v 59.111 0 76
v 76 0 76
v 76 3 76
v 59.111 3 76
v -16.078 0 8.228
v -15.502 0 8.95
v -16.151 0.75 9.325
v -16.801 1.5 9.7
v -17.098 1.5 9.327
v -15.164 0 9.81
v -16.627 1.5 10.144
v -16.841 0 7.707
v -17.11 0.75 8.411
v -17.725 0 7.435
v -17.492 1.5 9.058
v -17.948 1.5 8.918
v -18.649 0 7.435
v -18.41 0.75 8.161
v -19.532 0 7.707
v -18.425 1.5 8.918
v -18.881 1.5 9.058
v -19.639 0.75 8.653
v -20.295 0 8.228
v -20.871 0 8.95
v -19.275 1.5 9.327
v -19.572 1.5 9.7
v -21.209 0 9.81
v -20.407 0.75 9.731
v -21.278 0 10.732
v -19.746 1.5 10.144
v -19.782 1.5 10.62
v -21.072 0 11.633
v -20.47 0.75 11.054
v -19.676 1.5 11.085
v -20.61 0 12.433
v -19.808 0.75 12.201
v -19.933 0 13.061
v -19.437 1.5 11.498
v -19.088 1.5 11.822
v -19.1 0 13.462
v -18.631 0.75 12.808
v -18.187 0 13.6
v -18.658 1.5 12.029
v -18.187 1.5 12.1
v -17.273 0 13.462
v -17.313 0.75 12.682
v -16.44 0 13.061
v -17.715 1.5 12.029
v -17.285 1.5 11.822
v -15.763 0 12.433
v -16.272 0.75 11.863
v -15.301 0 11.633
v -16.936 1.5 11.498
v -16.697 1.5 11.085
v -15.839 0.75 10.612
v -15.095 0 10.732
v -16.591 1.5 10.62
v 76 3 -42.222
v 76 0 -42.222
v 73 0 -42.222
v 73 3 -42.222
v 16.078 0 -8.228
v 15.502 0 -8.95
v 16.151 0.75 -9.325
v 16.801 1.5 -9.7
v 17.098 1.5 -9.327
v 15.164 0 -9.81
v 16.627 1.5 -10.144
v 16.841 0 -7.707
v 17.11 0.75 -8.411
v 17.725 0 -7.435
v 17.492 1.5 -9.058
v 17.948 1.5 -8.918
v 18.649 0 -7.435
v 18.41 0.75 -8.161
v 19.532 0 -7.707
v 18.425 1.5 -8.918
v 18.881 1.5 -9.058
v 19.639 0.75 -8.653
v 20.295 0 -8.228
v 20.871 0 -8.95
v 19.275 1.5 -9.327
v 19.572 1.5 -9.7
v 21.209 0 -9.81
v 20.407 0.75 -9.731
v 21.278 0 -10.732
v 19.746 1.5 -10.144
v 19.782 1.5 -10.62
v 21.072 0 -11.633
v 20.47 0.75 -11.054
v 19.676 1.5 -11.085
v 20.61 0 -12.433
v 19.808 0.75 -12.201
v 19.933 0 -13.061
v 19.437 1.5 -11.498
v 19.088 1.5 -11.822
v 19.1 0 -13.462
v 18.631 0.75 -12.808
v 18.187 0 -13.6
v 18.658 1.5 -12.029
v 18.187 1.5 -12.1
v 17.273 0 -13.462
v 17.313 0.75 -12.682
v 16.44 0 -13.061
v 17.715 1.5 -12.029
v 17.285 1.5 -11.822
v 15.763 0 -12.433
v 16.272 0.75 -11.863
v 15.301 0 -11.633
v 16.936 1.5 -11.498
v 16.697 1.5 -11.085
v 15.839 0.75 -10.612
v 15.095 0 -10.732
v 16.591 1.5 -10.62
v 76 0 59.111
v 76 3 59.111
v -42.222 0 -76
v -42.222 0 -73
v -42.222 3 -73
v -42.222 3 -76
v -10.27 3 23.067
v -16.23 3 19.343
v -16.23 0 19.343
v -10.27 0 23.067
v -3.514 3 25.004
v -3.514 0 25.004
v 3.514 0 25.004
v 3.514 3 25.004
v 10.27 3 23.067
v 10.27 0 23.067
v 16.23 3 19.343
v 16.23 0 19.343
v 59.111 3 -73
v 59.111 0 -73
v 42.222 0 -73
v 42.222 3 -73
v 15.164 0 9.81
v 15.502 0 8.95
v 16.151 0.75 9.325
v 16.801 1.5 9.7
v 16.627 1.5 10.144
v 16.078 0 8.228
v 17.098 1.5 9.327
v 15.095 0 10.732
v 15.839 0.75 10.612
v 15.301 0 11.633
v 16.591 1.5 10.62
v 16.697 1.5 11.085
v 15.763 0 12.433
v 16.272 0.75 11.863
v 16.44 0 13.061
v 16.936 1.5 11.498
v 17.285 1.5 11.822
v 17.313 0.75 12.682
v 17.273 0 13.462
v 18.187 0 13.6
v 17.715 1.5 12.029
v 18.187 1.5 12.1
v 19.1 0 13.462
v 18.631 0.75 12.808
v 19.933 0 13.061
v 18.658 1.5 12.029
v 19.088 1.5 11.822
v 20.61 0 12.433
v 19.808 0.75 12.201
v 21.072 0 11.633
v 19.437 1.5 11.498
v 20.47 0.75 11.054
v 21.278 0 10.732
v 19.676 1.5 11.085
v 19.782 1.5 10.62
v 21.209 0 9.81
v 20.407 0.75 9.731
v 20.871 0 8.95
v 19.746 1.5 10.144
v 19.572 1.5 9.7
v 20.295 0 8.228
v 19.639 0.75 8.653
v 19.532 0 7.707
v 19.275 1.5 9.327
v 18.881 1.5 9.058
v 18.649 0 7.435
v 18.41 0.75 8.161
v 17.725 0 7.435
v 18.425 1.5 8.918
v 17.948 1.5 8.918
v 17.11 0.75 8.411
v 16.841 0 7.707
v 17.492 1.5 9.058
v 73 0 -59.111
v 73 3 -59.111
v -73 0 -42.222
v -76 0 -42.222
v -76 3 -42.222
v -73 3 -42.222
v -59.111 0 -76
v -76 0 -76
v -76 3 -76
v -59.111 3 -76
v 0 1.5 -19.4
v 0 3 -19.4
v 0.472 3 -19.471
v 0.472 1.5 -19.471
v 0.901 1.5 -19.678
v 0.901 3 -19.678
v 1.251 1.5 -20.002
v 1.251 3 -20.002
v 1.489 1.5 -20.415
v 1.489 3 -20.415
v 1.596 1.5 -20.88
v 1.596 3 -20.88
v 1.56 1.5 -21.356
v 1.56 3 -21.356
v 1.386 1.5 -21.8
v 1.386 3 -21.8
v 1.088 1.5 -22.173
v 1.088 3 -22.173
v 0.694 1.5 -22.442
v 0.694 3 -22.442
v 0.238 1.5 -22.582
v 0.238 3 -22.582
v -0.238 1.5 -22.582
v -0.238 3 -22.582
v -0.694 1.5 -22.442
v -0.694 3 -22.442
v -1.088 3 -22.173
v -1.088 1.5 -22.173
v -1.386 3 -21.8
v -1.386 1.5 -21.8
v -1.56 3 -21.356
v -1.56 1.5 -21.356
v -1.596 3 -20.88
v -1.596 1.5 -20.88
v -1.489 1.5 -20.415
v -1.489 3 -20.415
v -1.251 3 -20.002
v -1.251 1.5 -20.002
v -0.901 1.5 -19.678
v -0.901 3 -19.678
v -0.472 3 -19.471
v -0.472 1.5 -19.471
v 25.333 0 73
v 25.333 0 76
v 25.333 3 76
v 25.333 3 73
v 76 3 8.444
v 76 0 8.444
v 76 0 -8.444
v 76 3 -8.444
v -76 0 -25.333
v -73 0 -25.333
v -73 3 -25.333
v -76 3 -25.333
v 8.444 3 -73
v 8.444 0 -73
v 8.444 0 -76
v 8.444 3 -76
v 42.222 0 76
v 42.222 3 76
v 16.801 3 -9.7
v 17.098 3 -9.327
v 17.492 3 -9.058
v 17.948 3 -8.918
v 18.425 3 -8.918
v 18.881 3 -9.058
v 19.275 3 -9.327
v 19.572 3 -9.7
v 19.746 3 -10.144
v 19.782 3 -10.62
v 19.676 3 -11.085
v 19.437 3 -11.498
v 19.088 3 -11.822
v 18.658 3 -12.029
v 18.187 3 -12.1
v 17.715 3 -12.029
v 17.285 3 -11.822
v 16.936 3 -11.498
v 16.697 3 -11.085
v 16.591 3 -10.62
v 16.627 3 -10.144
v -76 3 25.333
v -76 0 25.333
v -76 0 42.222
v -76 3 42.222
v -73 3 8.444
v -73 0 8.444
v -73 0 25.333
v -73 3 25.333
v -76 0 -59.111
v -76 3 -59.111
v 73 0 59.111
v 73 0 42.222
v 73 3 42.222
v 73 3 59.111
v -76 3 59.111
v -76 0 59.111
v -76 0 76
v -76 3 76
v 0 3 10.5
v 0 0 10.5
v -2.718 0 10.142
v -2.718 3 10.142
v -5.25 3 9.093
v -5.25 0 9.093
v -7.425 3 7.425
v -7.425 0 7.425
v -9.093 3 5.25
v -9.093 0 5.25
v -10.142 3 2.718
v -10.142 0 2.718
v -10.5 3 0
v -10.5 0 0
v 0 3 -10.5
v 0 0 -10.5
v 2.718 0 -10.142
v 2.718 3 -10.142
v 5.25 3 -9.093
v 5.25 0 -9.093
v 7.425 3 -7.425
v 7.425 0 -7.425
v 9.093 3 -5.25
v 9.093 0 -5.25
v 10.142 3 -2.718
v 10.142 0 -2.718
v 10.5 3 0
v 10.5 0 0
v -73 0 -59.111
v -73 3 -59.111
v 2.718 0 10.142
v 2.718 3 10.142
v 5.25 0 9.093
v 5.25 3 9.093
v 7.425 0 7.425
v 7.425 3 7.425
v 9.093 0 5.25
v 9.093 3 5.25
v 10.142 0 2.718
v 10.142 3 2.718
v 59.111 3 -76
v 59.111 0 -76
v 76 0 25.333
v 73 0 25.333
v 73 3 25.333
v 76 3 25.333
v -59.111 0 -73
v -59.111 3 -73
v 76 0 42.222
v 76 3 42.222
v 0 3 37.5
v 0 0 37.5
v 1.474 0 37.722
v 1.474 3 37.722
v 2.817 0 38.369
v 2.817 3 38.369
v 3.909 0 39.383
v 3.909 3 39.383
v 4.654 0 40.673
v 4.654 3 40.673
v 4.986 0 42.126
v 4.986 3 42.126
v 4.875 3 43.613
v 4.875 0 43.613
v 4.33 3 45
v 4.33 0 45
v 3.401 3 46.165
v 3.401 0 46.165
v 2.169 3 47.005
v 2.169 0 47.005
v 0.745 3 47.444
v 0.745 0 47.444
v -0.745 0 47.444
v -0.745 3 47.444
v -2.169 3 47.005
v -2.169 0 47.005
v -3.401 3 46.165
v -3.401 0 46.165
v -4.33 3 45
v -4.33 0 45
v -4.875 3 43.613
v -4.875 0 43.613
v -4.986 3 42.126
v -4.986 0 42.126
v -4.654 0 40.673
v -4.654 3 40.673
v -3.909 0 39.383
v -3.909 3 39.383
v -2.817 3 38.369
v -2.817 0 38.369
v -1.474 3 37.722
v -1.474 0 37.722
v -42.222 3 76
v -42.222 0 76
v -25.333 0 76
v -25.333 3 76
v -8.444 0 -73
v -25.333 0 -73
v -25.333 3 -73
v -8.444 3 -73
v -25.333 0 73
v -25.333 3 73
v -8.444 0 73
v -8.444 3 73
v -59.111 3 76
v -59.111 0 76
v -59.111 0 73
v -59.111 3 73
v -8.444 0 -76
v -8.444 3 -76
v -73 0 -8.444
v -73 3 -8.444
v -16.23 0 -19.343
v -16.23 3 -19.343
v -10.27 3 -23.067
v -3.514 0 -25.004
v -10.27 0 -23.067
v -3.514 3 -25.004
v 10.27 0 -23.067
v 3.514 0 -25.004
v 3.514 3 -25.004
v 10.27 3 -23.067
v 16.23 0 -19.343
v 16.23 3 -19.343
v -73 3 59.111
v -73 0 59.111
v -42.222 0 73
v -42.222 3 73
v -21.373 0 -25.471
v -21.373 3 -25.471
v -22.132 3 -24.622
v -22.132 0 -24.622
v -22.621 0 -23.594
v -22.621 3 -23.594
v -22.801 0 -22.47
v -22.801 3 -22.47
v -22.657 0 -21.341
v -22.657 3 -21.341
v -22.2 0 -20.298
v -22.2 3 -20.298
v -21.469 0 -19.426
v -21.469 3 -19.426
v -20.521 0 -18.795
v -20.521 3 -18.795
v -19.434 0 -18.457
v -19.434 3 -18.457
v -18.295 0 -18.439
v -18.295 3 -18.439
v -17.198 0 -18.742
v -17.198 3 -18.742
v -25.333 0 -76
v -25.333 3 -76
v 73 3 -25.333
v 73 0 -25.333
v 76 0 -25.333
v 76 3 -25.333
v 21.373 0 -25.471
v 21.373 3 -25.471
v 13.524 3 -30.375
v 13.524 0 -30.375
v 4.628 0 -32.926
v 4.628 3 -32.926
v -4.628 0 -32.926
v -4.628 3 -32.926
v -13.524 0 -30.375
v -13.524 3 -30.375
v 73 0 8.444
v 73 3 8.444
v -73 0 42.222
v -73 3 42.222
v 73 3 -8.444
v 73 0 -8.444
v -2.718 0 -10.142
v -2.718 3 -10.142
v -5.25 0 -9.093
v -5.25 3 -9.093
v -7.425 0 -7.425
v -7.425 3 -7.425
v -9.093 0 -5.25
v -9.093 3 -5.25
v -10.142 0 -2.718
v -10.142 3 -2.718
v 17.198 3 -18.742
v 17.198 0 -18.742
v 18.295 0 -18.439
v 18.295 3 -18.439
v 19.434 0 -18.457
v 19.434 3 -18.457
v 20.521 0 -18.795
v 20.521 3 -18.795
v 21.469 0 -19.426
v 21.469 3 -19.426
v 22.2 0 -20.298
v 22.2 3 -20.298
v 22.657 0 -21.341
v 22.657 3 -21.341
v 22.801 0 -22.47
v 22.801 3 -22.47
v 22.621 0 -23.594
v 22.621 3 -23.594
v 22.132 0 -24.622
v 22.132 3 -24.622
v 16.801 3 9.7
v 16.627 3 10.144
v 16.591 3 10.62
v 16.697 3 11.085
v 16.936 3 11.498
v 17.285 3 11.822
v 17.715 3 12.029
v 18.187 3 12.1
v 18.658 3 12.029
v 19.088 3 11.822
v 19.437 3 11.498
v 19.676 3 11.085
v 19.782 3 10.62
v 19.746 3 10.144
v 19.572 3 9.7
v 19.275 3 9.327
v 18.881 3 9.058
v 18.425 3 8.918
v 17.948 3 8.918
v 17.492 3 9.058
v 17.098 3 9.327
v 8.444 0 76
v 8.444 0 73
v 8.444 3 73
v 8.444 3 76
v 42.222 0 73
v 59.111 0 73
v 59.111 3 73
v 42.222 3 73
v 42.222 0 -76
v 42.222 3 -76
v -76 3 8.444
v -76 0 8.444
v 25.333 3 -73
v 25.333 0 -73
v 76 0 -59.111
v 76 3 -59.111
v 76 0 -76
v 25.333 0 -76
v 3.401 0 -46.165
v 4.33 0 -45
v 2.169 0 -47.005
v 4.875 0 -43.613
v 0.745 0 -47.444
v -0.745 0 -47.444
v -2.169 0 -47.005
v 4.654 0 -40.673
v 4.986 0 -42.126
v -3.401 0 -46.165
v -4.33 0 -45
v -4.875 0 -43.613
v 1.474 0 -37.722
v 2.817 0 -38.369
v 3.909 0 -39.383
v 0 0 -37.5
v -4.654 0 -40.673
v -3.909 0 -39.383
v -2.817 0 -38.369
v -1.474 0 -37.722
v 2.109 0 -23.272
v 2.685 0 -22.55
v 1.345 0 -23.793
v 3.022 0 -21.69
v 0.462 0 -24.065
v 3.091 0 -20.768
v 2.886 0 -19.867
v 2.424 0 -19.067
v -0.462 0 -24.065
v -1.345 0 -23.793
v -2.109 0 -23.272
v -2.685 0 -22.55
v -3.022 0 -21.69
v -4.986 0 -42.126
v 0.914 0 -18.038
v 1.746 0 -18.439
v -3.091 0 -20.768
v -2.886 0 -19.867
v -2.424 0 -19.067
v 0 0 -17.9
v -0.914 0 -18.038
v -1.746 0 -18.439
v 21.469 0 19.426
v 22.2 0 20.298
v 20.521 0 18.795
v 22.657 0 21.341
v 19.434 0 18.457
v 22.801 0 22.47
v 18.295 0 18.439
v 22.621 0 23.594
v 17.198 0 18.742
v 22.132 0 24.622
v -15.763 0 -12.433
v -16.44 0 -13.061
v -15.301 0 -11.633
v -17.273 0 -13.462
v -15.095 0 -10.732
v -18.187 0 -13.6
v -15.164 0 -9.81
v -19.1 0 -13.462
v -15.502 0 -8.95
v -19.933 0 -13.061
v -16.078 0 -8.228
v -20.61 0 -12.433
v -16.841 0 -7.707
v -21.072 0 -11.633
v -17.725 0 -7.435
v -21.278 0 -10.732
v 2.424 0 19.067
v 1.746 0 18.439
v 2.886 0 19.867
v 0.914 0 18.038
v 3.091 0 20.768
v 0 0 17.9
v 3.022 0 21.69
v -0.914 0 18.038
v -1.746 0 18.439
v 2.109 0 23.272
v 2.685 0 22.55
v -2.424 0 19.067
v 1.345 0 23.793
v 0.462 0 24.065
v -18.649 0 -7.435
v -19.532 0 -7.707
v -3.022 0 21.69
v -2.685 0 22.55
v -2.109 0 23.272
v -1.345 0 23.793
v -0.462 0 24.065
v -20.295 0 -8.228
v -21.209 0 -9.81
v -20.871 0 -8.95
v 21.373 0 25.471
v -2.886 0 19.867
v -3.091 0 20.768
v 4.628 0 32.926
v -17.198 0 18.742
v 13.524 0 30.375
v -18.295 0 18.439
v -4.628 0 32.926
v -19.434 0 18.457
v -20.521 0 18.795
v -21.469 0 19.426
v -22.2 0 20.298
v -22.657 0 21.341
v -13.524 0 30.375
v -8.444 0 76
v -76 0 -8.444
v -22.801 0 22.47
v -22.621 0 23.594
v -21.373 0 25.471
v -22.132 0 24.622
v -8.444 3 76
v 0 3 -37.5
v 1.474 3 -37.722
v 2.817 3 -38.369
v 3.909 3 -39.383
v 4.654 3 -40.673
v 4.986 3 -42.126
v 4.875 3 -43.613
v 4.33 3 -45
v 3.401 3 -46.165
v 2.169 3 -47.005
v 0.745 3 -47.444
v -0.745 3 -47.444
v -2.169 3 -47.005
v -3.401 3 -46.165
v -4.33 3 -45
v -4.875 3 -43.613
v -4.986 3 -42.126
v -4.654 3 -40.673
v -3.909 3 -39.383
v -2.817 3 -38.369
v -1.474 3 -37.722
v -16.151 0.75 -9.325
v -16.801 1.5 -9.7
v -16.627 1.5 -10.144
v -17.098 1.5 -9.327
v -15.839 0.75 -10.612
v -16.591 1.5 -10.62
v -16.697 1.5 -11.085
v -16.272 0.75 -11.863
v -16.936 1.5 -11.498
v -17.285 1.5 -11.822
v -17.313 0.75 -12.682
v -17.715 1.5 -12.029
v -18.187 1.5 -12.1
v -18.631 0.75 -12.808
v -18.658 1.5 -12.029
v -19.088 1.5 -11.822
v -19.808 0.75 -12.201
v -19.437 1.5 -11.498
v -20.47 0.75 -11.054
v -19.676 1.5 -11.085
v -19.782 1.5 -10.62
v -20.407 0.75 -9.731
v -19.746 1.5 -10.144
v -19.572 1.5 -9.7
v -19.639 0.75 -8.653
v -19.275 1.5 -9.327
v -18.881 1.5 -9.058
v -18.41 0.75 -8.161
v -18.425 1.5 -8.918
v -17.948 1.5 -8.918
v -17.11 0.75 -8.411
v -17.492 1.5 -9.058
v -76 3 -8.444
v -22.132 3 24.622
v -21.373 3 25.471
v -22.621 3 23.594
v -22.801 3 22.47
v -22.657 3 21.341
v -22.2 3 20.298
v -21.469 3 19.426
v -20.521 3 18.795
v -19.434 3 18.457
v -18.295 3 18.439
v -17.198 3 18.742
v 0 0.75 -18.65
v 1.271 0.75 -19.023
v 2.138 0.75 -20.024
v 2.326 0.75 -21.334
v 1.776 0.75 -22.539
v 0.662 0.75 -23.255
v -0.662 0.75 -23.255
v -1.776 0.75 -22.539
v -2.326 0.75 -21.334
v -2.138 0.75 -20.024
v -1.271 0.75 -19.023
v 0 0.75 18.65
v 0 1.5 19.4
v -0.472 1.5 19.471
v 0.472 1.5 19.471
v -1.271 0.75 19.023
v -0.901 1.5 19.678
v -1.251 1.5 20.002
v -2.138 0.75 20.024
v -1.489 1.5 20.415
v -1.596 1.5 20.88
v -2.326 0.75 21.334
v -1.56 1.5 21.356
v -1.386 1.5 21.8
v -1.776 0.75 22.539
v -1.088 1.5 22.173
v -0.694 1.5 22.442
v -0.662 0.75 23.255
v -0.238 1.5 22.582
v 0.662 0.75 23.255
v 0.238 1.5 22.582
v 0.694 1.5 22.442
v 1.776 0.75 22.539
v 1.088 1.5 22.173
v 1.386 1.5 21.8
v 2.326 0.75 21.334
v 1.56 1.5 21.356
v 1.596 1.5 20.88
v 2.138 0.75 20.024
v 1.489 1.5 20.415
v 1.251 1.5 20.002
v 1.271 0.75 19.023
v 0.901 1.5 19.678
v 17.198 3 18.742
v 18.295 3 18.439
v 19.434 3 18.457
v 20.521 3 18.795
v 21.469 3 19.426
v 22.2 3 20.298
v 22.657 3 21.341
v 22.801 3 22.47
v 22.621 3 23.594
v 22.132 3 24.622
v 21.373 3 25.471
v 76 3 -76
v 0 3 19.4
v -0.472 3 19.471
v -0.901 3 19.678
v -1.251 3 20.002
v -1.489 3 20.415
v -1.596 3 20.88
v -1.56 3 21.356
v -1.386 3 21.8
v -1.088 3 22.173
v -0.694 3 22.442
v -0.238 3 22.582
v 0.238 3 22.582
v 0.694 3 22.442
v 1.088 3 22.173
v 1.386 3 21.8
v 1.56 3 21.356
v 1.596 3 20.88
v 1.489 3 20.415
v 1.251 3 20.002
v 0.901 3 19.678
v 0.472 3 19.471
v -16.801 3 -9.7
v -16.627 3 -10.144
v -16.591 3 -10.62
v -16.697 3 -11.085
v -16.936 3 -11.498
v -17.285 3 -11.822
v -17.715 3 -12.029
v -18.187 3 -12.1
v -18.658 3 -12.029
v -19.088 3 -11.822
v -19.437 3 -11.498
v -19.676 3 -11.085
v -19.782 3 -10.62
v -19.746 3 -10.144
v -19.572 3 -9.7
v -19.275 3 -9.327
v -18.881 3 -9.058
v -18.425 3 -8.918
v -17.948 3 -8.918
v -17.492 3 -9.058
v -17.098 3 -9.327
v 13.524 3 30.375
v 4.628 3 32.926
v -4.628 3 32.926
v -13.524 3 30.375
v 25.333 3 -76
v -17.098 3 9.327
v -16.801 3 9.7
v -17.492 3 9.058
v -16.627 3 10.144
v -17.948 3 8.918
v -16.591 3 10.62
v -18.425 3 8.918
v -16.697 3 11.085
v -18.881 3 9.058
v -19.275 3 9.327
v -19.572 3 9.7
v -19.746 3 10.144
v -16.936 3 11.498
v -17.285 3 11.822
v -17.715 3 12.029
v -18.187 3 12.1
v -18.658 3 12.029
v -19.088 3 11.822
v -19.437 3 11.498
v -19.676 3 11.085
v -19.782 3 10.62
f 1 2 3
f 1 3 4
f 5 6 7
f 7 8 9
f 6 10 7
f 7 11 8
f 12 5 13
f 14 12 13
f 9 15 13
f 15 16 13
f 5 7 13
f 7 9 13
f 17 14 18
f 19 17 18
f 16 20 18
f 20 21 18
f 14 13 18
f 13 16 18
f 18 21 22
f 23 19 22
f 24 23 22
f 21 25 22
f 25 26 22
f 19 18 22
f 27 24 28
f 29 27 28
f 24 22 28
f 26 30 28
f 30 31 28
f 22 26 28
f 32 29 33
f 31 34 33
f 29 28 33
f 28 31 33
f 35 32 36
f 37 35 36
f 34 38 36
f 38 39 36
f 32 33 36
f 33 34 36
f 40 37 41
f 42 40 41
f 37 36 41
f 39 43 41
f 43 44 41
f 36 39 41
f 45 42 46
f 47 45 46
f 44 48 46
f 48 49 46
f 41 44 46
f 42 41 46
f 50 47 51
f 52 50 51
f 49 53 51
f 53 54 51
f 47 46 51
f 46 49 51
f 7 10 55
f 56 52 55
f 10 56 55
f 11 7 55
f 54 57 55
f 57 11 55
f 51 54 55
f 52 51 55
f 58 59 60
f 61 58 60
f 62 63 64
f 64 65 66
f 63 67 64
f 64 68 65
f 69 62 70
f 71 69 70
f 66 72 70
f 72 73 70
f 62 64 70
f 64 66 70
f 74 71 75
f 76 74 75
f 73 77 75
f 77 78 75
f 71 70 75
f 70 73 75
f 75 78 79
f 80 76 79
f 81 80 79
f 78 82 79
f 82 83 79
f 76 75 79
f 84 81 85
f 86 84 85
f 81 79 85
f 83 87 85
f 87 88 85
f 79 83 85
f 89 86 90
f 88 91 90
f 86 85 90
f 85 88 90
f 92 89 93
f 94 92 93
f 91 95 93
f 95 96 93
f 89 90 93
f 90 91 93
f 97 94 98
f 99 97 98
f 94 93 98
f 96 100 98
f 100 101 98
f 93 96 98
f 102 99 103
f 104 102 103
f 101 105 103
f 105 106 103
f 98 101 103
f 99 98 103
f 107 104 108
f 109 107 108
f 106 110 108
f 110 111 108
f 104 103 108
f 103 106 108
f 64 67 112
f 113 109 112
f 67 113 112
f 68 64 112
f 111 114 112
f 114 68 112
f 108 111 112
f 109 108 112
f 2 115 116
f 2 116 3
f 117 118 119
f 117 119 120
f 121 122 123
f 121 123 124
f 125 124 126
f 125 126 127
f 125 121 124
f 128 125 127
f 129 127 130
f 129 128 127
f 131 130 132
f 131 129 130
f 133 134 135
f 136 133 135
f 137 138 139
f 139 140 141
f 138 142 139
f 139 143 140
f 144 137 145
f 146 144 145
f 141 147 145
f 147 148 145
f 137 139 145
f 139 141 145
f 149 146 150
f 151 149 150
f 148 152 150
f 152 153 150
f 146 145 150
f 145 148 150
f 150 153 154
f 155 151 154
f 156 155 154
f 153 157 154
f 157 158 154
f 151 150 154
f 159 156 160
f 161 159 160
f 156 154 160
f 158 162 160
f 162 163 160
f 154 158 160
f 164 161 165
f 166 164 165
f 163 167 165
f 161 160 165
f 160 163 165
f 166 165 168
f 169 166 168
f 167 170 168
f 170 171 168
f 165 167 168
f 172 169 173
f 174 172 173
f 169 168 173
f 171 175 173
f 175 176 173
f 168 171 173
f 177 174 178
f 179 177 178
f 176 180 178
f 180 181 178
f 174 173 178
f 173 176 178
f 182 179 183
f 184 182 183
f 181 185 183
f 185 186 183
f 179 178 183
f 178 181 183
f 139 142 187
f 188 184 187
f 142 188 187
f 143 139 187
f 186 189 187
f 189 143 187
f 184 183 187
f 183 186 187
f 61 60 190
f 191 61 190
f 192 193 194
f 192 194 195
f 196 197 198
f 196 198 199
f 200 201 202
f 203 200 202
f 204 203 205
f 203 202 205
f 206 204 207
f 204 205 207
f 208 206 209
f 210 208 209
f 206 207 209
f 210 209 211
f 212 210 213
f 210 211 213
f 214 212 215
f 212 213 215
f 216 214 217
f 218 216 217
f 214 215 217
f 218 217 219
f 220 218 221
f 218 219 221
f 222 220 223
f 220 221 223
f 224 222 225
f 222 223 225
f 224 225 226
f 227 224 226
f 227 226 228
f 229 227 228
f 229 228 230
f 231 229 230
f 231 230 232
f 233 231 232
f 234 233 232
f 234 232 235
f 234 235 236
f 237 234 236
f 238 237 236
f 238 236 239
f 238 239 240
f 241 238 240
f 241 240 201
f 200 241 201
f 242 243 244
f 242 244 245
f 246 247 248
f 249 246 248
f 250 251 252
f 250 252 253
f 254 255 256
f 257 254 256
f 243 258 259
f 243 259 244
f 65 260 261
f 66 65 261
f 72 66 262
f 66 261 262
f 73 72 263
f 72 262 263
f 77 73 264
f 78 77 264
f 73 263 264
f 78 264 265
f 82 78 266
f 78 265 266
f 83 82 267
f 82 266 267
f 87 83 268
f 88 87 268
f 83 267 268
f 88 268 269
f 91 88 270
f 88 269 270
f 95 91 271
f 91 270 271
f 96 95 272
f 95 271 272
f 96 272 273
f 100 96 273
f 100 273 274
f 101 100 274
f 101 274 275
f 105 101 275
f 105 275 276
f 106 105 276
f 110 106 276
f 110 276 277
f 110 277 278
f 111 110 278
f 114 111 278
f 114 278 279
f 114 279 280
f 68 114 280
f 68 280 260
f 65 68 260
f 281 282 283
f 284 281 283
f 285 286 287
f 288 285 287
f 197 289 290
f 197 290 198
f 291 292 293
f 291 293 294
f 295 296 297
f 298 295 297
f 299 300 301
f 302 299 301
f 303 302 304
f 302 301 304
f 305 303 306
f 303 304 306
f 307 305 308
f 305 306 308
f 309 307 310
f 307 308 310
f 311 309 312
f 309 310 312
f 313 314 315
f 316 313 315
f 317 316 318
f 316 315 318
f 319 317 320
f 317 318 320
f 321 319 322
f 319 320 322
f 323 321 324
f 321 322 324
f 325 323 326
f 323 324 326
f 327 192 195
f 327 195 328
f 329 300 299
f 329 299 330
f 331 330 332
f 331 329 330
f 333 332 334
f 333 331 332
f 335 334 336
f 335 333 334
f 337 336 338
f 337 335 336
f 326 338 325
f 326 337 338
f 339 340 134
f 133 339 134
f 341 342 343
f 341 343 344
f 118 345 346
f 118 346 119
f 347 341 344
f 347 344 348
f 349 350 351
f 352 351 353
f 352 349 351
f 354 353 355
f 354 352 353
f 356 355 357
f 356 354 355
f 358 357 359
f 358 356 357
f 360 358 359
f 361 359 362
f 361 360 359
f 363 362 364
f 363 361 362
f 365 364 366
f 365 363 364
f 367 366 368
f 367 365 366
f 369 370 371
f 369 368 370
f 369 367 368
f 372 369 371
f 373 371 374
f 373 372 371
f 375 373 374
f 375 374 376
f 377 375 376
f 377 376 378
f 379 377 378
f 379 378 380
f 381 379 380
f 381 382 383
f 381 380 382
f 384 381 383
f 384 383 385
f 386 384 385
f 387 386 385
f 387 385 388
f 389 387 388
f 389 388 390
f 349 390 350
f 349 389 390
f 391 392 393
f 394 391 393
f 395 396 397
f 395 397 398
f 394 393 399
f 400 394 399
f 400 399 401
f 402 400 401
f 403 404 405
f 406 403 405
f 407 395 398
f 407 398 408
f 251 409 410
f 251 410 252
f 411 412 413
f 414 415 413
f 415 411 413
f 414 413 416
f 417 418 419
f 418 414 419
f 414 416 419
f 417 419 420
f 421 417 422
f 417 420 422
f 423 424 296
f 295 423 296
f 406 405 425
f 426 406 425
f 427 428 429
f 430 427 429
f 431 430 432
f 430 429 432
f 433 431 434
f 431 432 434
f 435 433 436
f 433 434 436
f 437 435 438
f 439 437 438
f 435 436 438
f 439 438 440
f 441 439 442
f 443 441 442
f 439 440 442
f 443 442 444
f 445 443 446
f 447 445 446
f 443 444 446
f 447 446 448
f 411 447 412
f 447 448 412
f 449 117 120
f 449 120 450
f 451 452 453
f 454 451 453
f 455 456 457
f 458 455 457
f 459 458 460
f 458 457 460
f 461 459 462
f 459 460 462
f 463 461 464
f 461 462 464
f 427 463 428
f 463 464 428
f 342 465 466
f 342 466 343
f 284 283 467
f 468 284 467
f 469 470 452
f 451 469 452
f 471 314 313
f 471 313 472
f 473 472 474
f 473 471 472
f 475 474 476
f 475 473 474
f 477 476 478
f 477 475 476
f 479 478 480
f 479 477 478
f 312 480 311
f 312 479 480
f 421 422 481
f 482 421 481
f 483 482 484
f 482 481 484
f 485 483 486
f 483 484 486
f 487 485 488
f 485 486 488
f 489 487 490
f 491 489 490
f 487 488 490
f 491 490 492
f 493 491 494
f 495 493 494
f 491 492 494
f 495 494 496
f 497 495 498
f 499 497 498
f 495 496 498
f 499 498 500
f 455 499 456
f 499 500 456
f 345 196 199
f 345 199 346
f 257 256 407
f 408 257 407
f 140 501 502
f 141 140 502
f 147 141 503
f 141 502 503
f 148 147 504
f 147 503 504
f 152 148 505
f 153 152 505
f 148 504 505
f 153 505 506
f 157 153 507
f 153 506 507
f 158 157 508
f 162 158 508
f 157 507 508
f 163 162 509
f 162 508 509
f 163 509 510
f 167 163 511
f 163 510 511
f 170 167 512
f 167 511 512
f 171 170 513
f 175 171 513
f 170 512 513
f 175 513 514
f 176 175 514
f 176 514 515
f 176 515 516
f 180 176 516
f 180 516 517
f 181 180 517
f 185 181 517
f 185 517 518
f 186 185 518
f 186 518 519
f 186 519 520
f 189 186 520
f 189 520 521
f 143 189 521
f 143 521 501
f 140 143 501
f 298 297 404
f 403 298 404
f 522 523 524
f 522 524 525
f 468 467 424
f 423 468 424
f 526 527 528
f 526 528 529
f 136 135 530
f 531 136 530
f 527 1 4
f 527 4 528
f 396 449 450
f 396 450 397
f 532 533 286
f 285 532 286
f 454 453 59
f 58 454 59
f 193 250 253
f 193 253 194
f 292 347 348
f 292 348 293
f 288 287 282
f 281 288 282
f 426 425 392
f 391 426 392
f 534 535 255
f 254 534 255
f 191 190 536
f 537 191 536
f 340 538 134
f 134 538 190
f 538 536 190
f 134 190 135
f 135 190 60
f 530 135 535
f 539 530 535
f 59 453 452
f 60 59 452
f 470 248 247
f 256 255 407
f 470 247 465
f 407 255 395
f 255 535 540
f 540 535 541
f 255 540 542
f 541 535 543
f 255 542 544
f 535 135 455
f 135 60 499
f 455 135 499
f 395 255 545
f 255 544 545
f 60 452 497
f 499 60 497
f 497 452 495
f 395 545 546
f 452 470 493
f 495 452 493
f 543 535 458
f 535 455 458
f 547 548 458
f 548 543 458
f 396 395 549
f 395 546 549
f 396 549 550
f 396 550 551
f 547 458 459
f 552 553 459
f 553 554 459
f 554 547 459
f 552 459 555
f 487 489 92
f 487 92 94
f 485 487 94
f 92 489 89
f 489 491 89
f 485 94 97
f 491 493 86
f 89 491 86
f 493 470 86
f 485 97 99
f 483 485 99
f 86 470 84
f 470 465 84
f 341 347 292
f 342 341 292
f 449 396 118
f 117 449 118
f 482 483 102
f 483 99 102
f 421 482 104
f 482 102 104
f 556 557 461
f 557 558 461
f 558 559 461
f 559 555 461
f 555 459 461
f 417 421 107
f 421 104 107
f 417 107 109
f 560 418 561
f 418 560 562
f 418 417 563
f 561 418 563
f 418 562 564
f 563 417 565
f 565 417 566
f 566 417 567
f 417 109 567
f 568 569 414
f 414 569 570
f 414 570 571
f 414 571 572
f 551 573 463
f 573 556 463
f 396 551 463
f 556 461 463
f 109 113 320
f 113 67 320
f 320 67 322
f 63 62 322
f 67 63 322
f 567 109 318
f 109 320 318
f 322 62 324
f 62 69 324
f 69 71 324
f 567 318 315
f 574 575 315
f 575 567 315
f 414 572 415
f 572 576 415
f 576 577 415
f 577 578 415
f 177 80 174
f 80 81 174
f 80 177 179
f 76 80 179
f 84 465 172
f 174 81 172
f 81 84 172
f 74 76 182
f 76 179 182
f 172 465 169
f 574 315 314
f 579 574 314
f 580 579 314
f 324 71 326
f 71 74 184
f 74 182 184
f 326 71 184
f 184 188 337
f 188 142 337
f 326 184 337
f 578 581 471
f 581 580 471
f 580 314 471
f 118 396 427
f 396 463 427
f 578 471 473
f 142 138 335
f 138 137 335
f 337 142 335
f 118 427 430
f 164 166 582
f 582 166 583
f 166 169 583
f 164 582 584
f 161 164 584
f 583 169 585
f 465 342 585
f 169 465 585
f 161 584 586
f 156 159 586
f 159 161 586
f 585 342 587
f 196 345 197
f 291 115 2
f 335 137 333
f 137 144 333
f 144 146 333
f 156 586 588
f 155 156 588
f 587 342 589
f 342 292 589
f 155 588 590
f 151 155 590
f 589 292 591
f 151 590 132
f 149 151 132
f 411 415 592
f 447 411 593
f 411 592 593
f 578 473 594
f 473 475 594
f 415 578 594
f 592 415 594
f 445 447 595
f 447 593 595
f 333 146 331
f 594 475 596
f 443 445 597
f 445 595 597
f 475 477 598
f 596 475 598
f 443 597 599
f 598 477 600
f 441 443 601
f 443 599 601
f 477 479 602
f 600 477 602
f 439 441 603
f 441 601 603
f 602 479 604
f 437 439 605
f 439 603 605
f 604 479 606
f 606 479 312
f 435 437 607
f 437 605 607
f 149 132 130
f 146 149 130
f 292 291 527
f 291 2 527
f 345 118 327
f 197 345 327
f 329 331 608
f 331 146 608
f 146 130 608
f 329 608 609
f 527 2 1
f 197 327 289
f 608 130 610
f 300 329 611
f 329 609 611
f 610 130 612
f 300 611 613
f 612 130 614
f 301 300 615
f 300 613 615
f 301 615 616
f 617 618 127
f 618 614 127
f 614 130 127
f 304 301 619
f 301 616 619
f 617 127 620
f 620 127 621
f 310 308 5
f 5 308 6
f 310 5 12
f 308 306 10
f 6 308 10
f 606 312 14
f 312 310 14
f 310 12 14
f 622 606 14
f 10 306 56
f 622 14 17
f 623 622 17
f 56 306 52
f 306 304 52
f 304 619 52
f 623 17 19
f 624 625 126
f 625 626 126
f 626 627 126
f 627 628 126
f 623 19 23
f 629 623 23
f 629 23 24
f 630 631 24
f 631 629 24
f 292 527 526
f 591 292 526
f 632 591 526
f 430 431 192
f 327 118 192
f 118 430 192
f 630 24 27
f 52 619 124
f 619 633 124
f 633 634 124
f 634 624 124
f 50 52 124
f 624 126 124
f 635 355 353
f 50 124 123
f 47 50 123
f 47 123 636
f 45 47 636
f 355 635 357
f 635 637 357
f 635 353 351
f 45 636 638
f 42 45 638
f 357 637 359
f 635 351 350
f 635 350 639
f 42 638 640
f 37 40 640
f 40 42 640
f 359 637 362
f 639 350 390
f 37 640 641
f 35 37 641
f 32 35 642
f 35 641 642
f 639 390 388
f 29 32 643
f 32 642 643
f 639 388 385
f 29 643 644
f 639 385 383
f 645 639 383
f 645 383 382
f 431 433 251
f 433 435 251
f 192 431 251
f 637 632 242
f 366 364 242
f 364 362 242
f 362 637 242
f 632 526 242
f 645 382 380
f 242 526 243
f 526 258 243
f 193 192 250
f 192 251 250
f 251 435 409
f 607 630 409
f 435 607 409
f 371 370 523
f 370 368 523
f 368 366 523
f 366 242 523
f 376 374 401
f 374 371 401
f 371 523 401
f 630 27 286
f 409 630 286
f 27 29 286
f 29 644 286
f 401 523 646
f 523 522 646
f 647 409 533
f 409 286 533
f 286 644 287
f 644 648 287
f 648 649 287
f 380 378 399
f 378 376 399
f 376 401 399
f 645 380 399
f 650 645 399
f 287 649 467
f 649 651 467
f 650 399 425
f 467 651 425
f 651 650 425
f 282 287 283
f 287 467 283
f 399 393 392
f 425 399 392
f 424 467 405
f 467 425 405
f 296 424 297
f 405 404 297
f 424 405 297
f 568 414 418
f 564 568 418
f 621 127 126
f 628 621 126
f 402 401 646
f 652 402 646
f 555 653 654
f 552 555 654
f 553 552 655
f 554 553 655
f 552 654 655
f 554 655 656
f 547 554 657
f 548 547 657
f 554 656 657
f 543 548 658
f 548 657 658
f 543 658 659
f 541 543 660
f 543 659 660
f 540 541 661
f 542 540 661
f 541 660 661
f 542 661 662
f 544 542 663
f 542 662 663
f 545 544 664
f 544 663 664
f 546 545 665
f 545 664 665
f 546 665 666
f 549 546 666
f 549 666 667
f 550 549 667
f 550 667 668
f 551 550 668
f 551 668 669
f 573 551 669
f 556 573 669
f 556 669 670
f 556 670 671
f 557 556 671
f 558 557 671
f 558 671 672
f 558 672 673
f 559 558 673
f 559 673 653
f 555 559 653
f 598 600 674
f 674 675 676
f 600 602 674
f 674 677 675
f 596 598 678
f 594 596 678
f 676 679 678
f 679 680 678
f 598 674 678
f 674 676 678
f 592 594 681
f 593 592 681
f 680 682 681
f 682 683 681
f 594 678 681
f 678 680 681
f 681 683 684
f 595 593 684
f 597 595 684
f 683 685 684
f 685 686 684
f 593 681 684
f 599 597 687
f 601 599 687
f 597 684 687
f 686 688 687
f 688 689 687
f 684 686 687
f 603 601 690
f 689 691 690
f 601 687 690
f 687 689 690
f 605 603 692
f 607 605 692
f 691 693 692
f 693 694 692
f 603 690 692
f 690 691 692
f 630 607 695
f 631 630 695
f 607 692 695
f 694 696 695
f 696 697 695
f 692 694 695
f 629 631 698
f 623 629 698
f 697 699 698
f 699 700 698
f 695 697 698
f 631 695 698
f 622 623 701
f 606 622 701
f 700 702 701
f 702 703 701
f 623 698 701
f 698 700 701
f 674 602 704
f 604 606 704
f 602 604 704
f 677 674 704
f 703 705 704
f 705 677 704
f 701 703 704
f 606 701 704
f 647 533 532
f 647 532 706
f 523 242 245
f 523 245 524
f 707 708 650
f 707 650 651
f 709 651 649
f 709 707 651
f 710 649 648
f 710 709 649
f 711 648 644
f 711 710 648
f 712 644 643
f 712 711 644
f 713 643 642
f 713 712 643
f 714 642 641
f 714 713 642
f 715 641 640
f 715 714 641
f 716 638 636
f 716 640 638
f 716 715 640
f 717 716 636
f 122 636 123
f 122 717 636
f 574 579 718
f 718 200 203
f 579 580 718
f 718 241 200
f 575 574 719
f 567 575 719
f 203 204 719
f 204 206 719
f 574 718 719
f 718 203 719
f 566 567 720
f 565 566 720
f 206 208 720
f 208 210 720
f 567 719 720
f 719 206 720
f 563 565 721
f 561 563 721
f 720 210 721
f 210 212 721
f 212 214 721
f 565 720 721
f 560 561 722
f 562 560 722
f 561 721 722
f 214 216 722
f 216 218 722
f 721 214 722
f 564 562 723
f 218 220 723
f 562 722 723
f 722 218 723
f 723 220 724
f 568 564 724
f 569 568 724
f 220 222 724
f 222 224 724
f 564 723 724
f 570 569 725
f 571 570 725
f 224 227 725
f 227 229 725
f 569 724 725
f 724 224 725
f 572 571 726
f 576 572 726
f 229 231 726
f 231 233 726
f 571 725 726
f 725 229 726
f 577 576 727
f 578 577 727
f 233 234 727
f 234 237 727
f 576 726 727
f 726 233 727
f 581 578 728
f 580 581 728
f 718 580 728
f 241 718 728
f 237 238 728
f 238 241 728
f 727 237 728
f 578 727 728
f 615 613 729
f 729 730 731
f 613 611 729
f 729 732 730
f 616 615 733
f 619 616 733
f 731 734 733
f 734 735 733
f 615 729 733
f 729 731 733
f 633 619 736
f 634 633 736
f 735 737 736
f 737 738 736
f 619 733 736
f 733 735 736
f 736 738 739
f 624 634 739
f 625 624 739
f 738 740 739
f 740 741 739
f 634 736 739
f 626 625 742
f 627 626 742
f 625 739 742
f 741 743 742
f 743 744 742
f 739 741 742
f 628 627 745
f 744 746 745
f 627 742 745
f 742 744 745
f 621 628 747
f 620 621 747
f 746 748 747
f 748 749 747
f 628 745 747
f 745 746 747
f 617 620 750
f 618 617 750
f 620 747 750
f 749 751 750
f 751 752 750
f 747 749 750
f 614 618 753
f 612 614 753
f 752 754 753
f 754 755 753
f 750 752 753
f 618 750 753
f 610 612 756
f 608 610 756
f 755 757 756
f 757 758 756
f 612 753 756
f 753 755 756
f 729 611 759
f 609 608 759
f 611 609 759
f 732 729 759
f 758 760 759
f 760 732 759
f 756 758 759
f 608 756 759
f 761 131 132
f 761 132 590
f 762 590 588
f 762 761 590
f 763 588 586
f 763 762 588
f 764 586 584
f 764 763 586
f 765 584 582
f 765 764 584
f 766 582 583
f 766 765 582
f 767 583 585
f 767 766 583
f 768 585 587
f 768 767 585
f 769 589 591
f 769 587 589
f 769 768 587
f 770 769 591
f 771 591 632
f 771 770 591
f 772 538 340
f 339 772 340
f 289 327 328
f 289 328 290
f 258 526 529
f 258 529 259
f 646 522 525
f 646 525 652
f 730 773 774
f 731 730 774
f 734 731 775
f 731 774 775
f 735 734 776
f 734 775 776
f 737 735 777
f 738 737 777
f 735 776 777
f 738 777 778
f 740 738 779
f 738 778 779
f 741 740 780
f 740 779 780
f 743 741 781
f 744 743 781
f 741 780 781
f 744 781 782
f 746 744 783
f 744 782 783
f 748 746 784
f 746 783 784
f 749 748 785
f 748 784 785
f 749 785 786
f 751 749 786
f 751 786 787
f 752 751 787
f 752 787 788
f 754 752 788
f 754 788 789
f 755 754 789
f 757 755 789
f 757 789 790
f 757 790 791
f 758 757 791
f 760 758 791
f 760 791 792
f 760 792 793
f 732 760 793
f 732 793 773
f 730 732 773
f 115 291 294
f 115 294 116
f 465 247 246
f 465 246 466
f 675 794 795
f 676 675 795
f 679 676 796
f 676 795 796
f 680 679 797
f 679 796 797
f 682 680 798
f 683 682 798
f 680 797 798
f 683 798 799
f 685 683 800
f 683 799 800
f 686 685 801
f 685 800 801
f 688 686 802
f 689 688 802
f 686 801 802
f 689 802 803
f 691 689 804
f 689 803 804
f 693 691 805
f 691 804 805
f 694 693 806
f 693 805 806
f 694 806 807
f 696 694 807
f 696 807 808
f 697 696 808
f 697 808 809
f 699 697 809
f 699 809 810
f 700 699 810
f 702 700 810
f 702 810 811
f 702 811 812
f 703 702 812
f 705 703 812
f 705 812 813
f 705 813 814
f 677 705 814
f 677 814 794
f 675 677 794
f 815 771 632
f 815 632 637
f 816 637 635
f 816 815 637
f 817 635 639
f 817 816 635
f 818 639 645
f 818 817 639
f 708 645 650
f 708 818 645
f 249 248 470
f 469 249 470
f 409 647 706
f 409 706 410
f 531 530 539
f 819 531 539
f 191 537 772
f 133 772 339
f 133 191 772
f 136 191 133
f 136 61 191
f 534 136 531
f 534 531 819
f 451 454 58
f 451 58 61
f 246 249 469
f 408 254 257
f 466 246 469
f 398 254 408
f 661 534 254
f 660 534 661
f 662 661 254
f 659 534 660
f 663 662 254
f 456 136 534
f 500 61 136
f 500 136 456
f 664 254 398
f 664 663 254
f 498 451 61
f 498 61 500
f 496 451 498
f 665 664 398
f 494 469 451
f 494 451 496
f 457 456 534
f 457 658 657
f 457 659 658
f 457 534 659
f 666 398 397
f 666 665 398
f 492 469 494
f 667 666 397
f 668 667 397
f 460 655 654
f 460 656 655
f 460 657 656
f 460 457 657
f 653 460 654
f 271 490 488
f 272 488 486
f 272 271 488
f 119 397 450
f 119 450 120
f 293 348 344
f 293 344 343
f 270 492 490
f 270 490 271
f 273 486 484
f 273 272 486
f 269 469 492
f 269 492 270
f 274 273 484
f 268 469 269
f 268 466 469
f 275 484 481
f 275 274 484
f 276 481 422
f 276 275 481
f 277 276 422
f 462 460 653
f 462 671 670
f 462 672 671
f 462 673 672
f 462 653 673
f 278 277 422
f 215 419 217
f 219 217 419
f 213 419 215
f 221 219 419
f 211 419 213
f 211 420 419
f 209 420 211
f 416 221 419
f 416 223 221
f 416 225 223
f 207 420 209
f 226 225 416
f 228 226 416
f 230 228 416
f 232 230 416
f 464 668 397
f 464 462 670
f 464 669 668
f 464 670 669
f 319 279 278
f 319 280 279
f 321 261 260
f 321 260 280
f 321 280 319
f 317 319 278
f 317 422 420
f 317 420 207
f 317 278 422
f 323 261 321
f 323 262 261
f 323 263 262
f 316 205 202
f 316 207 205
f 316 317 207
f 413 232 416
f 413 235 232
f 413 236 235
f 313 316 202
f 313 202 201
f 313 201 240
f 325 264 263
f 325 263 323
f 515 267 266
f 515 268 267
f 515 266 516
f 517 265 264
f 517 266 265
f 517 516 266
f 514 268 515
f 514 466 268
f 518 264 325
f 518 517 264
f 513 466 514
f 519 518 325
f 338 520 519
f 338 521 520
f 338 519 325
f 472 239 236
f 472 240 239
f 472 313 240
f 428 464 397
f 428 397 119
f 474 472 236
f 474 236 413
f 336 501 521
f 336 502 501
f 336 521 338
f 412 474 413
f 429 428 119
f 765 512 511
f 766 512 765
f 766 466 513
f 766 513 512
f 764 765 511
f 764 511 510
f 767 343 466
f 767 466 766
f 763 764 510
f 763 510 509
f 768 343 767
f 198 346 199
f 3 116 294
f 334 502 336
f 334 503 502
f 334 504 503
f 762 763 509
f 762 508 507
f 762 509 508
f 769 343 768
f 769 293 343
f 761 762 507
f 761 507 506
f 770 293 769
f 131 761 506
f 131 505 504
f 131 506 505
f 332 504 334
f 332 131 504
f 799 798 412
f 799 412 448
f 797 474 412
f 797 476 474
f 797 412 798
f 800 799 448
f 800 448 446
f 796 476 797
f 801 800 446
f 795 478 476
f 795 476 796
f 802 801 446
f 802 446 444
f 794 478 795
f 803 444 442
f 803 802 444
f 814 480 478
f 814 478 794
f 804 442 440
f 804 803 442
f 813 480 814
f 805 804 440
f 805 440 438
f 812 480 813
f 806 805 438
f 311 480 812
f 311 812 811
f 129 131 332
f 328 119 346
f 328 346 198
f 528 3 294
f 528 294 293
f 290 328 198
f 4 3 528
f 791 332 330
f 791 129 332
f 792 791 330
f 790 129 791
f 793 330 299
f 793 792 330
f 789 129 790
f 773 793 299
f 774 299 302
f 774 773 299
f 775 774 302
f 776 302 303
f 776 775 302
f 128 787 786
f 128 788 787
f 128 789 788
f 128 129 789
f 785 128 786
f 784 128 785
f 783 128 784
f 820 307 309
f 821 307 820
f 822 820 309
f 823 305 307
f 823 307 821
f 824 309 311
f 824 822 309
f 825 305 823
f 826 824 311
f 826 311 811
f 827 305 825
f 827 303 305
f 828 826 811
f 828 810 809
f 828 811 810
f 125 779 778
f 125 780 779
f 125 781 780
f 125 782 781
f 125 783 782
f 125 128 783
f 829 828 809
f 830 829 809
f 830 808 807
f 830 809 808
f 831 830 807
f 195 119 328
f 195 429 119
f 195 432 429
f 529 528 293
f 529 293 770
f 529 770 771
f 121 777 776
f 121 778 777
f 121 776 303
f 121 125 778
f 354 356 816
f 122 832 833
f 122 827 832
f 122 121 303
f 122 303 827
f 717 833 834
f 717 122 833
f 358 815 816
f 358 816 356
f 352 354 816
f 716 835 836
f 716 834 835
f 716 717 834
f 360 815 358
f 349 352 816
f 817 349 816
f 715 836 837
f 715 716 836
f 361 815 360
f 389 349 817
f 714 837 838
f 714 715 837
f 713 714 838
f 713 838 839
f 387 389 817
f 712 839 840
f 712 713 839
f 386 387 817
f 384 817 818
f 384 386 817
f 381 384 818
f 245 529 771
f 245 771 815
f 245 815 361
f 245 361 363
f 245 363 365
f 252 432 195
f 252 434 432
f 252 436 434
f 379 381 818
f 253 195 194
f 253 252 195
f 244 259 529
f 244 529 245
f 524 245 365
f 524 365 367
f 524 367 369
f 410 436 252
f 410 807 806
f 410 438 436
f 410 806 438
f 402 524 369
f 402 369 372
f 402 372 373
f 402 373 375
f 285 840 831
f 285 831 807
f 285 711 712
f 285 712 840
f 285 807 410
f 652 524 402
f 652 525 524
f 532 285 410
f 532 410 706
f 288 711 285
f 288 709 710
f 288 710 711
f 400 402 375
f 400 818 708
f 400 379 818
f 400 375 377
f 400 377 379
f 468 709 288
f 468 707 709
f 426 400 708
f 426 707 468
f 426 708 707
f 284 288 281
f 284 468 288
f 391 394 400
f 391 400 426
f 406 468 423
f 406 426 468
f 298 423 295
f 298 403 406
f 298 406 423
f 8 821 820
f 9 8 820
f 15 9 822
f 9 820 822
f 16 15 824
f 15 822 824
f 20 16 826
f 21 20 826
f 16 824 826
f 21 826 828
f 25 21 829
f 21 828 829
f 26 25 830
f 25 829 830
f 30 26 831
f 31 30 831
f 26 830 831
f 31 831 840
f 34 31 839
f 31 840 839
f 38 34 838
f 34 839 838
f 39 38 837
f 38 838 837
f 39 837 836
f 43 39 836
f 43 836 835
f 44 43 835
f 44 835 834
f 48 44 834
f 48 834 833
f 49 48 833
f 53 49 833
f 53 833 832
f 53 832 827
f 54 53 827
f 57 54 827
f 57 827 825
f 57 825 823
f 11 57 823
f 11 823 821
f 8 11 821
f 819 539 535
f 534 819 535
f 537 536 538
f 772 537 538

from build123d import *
from build123d.topology import SkipClean

# Parameters (mm, degrees)
BOSS_EXTRUDE1_DEPTH                      = 3
MIRROR1_AT_THE_SECOND_PLANE_COPY_1_DEPTH = 3
SKETCH2_R                                = 1.6
CUT_EXTRUDE1_DEPTH                       = 108.522090753
CHAMFER1_SIZE                            = 1.5
CIRPATTERN1_COUNT                        = 6
CHAMFER1_OF_CIRPATTERN1_SIZE             = 1.5
SKETCH3_R                                = 5
CUT_EXTRUDE2_DEPTH                       = 108.522090753


with BuildPart() as part:
    # Sketch1 → Boss-Extrude1 (new body)
    with BuildSketch(Plane(origin=(0, 0, 0), x_dir=(1, 0, 0), z_dir=(0, 1, 0))):
        with BuildLine():
            Line((-76, -76), (-59.111111111, -76))
            Line((-59.111111111, -76), (-59.111111111, -73))
            Line((-59.111111111, -73), (-42.222222222, -73))
            Line((-42.222222222, -73), (-42.222222222, -76))
            Line((-42.222222222, -76), (-25.333333333, -76))
            Line((-25.333333333, -76), (-25.333333333, -73))
            Line((-25.333333333, -73), (-8.444444444, -73))
            Line((-8.444444444, -73), (-8.444444444, -76))
            Line((-8.444444444, -76), (0, -76))
            Line((0, -76), (0, -10.5))
            ThreePointArc((0, -10.5), (-7.424621202, -7.424621202), (-10.5, 0))
            Line((-10.5, 0), (-76, 0))
            Line((-76, 0), (-76, -8.444444444))
            Line((-76, -8.444444444), (-73, -8.444444444))
            Line((-73, -8.444444444), (-73, -25.333333333))
            Line((-73, -25.333333333), (-76, -25.333333333))
            Line((-76, -25.333333333), (-76, -42.222222222))
            Line((-76, -42.222222222), (-73, -42.222222222))
            Line((-73, -42.222222222), (-73, -59.111111111))
            Line((-73, -59.111111111), (-76, -59.111111111))
            Line((-76, -59.111111111), (-76, -76))
        make_face()
    boss_extrude1 = extrude(amount=BOSS_EXTRUDE1_DEPTH)

    # Mirror1 at the second plane: Boss-Extrude1 across plane
    add(boss_extrude1.mirror(Plane(origin=(0, 0, 0), x_dir=(0, 0, 1), z_dir=(1, 0, 0))))



with BuildPart() as mirror1_1:
    # Mirror1: Boss-Extrude1 across plane
    add(boss_extrude1.mirror(Plane.XY))


with BuildPart() as part_1:
    with SkipClean():  # the faces are left unmerged after this step: merging them gives an invalid solid
        add(part.part)

        add(mirror1_1.part)  # Mirror1 at the second plane copy 1 merges Mirror1_1
        # Mirror1 at the second plane copy 1 sketc → Mirror1 at the second plane copy 1 (add)
        with BuildSketch(Plane(origin=(0, 0, 0), x_dir=(-1, 0, 0), z_dir=(0, 1, 0))):
            with BuildLine():
                Line((-76, -76), (-59.111111111, -76))
                Line((-59.111111111, -76), (-59.111111111, -73))
                Line((-59.111111111, -73), (-42.222222222, -73))
                Line((-42.222222222, -73), (-42.222222222, -76))
                Line((-42.222222222, -76), (-25.333333333, -76))
                Line((-25.333333333, -76), (-25.333333333, -73))
                Line((-25.333333333, -73), (-8.444444444, -73))
                Line((-8.444444444, -73), (-8.444444444, -76))
                Line((-8.444444444, -76), (0, -76))
                Line((0, -76), (0, -10.5))
                ThreePointArc((0, -10.5), (-7.424621202, -7.424621202), (-10.5, 0))
                Line((-10.5, 0), (-76, 0))
                Line((-76, 0), (-76, -8.444444444))
                Line((-76, -8.444444444), (-73, -8.444444444))
                Line((-73, -8.444444444), (-73, -25.333333333))
                Line((-73, -25.333333333), (-76, -25.333333333))
                Line((-76, -25.333333333), (-76, -42.222222222))
                Line((-76, -42.222222222), (-73, -42.222222222))
                Line((-73, -42.222222222), (-73, -59.111111111))
                Line((-73, -59.111111111), (-76, -59.111111111))
                Line((-76, -59.111111111), (-76, -76))
            make_face()
        extrude(amount=MIRROR1_AT_THE_SECOND_PLANE_COPY_1_DEPTH)

    # Sketch2 → Cut-Extrude1 (cut, through all)
    with SkipClean():  # the faces are left unmerged after this step: merging them gives an invalid solid
        with BuildSketch(Plane(origin=(0, 3, 0), x_dir=(1, 0, 0), z_dir=(0, 1, 0))):
            with Locations(Location((0, 21, 0), (0, 0, 270))):
                Circle(SKETCH2_R)
        cut_extrude1 = extrude(amount=-CUT_EXTRUDE1_DEPTH, mode=Mode.SUBTRACT)

    # Chamfer1
    chamfer1_edges = [part_1.edges().sort_by_distance(p)[0] for p in [
        (-1.6, 0, -21),
    ]]
    chamfer(chamfer1_edges, length=CHAMFER1_SIZE)

    # CirPattern1: Cut-Extrude1 ×6 about axis
    cirpattern1_axis = Axis((0, 0, 0), (0, 1, 0))
    for i in range(1, CIRPATTERN1_COUNT):
        add(cut_extrude1.rotate(cirpattern1_axis, i * 360 / CIRPATTERN1_COUNT), mode=Mode.SUBTRACT)

    # Chamfer1 of CirPattern1
    chamfer1_of_cirpattern1_edges = [part_1.edges().sort_by_distance(p)[0] for p in [
        (-18.986533479, 0, -9.114359354),
        (-17.386533479, 0, 11.885640646),
        (1.6, 0, 21),
        (18.986533479, 0, 9.114359354),
        (17.386533479, 0, -11.885640646),
    ]]
    chamfer(chamfer1_of_cirpattern1_edges, length=CHAMFER1_OF_CIRPATTERN1_SIZE)

    # Sketch3 → Cut-Extrude2 (cut, through all)
    with BuildSketch(Plane(origin=(0, 3, 0), x_dir=(1, 0, 0), z_dir=(0, 1, 0))):
        with Locations(Location((0, 42.5, 0), (0, 0, 270))):
            Circle(SKETCH3_R)
        with BuildLine():
            ThreePointArc((-21.372688022, 25.470977734), (-21.865715356, 19.835649522), (-16.230387145, 19.342622189))
            ThreePointArc((-16.230387145, 19.342622189), (0, 25.25), (16.230387145, 19.342622189))
            ThreePointArc((16.230387145, 19.342622189), (21.865715356, 19.835649522), (21.372688022, 25.470977734))
            ThreePointArc((21.372688022, 25.470977734), (0, 33.25), (-21.372688022, 25.470977734))
        make_face()
    cut_extrude2 = extrude(amount=-CUT_EXTRUDE2_DEPTH, mode=Mode.SUBTRACT)

    # Mirror2: Cut-Extrude2 across plane
    add(cut_extrude2.mirror(Plane.XY), mode=Mode.SUBTRACT)


solid = part_1.part
